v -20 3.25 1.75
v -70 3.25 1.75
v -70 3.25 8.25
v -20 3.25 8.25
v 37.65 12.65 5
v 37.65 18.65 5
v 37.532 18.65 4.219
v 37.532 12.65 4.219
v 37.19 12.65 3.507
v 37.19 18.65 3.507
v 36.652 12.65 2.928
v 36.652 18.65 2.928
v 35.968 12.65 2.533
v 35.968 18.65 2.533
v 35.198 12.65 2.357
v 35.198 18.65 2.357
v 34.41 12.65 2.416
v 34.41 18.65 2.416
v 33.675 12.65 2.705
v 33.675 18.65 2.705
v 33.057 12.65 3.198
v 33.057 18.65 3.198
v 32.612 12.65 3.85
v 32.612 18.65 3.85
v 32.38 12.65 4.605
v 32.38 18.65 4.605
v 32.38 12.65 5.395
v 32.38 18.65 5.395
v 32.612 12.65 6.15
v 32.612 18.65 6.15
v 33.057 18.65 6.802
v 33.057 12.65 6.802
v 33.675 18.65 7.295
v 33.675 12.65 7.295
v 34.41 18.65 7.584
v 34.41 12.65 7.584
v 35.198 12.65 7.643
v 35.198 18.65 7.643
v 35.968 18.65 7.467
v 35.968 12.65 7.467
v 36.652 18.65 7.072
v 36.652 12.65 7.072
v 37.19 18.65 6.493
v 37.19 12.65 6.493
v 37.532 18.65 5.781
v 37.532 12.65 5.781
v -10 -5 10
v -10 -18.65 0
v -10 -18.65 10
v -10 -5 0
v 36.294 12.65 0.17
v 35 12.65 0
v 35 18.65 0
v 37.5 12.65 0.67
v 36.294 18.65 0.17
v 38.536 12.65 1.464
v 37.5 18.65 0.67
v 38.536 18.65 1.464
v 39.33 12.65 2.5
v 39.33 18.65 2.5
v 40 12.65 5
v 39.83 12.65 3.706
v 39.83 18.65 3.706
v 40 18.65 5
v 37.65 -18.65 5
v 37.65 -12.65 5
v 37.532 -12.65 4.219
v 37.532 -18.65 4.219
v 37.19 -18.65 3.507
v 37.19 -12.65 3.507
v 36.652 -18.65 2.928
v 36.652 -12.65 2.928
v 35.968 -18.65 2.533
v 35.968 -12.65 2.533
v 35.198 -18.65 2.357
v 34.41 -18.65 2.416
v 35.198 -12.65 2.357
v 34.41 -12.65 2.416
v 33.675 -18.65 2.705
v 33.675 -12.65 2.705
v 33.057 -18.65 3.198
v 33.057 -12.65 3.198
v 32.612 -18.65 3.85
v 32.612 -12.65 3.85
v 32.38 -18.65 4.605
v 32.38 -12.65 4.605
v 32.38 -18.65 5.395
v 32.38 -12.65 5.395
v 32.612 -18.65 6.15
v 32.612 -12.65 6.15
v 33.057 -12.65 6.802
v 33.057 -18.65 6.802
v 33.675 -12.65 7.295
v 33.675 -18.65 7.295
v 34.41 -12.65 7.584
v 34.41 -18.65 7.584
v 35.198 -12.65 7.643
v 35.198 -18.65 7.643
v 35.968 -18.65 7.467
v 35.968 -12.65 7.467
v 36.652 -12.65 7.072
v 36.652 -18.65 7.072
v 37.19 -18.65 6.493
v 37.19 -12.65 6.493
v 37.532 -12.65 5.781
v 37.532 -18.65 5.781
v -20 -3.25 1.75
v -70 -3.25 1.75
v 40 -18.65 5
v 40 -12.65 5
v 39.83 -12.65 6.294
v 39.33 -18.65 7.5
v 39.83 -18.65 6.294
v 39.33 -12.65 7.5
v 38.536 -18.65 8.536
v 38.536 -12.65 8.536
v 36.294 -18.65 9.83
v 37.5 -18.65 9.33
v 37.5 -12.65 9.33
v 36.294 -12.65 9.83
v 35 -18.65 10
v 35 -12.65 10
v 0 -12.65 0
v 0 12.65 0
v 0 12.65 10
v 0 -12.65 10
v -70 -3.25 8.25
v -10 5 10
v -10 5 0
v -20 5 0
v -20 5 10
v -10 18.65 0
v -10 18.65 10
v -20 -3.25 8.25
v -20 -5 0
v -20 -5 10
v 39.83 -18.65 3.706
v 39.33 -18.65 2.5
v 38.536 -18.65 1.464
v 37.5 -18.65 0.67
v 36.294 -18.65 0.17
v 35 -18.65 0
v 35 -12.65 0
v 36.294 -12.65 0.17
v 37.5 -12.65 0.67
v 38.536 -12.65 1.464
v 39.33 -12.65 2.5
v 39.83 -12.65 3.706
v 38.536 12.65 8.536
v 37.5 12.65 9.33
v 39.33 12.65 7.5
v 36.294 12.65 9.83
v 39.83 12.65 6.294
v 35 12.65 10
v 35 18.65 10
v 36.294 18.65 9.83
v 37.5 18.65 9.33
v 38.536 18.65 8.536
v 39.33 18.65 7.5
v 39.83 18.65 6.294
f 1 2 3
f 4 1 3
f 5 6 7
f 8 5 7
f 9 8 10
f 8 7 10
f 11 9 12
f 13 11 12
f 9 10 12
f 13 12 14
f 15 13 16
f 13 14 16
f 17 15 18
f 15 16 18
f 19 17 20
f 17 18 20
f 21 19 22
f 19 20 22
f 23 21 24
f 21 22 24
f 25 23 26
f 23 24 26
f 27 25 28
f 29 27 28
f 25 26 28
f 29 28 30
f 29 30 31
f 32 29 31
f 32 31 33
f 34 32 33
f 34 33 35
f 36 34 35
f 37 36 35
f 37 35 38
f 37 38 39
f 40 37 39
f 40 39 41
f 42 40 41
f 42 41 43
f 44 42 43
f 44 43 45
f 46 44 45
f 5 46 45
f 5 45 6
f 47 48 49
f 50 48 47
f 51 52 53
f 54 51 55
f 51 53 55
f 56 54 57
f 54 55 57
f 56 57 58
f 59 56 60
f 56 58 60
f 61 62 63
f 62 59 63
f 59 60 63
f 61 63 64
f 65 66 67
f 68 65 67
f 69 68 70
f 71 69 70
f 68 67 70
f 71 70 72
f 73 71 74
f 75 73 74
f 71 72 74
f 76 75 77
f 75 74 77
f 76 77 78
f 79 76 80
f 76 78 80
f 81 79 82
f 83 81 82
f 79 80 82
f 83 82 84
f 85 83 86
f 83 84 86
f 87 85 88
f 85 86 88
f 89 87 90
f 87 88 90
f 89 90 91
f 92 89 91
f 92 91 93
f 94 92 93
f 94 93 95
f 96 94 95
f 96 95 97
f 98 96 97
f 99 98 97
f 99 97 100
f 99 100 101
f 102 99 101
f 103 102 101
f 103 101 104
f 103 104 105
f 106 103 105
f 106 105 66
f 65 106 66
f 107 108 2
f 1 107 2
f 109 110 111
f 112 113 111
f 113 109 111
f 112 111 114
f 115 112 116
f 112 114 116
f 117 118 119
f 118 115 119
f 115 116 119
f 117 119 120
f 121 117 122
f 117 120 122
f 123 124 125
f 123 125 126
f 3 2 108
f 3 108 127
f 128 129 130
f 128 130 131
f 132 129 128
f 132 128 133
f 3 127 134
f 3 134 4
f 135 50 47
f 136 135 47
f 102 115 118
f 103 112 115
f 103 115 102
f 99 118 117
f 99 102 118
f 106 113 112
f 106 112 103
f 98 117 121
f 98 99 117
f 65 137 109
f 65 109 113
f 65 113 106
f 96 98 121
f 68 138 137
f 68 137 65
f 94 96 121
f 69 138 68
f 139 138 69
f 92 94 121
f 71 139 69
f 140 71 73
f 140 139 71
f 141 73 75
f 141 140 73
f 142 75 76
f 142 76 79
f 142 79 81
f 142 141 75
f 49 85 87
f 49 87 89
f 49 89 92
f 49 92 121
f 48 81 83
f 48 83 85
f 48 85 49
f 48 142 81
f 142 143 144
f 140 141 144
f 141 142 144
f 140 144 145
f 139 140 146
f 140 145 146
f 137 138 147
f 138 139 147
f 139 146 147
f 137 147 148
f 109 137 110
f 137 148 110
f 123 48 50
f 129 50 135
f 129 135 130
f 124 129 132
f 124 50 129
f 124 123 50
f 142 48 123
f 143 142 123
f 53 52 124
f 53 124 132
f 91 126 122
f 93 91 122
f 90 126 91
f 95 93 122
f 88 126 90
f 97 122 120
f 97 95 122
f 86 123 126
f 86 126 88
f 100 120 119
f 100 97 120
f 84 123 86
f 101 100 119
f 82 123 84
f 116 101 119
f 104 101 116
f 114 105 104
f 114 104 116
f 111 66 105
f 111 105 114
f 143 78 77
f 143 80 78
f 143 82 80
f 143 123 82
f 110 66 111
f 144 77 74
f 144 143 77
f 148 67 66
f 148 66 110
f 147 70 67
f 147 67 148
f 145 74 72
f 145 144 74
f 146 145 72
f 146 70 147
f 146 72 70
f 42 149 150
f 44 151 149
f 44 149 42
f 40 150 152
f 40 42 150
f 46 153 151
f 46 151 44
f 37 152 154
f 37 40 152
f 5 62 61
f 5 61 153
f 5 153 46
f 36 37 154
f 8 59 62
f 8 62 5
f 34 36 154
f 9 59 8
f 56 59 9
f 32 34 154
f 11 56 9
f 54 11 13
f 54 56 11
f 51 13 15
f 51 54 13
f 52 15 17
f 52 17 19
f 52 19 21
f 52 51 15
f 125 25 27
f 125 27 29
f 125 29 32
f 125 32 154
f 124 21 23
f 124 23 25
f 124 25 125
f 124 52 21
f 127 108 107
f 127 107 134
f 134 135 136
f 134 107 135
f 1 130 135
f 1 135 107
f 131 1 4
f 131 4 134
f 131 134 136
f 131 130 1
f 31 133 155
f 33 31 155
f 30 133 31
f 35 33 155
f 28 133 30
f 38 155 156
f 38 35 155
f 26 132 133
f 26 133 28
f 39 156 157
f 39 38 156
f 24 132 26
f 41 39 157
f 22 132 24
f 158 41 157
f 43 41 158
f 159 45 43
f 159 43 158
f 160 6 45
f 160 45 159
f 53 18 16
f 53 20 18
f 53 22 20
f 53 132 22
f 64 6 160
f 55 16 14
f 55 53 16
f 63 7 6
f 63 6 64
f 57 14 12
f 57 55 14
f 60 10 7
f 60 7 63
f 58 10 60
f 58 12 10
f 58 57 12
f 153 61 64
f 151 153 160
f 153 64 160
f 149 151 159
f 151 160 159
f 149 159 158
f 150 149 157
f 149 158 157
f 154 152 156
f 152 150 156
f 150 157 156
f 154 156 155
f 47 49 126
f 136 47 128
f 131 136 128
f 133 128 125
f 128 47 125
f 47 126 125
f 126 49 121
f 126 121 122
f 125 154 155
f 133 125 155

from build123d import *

# Parameters (mm, degrees)
EXTRUDE_1_DEPTH     = 10
SKETCH_2_W          = 10
SKETCH_2_H          = 10
SKETCH_2_W_2        = 6.5
SKETCH_2_H_2        = 6.5
EXTRUDE_2_DEPTH     = 10
EXTRUDE_START       = 10
SKETCH_2_3_W        = 6.5
SKETCH_2_3_H        = 6.5
EXTRUDE_3_DEPTH     = 50
CUT_EXTRUDE_1_DEPTH = 80.945543966


with BuildPart() as part:
    # 草图1 → 凸台-拉伸1 (new body)
    with BuildSketch(Plane.XY):
        Polygon((0, 12.65), (0, -12.65), (40, -12.65), (40, -18.65), (-10, -18.65), (-10, 18.65), (40, 18.65), (40, 12.65), align=None)
    extrude(amount=EXTRUDE_1_DEPTH)

    # 草图2 → 凸台-拉伸2 (add)
    # profile 1 of 2: a face of its own
    with BuildSketch(Plane.ZY.offset(10)):
        with Locations((5, 0)):
            Rectangle(SKETCH_2_W, SKETCH_2_H)
        with Locations((5, 0)):
            Rectangle(SKETCH_2_W_2, SKETCH_2_H_2, mode=Mode.SUBTRACT)
    # profile 2 of 2: a face of its own
    with BuildSketch(Plane.ZY.offset(10)):
        with Locations((5, 0)):
            Rectangle(SKETCH_2_W_2, SKETCH_2_H_2)
    extrude(amount=EXTRUDE_2_DEPTH)

    # 草图2<3> → 凸台-拉伸3 (add)
    with BuildSketch(Plane.ZY.offset(10).offset(EXTRUDE_START)):
        with Locations((5, 0)):
            Rectangle(SKETCH_2_3_W, SKETCH_2_3_H)
    extrude(amount=EXTRUDE_3_DEPTH)

    # 草图3 → 切除-拉伸1 (cut, through all)
    with BuildSketch(Plane(origin=(0, 18.65, 0), x_dir=(1, 0, 0), z_dir=(0, 1, 0))):
        with BuildLine():
            ThreePointArc((32.35, -5), (35, -7.65), (37.65, -5))
            Line((37.65, -5), (32.35, -5))
        make_face()
        with BuildLine():
            Line((32.35, -5), (37.65, -5))
            ThreePointArc((37.65, -5), (35, -2.35), (32.35, -5))
        make_face()
        with BuildLine():
            ThreePointArc((35, 0), (38.535533906, -1.464466094), (40, -5))
            Line((40, -5), (40, 0))
            Line((40, 0), (35, 0))
        make_face()
        with BuildLine():
            Line((40, -10), (40, -5))
            ThreePointArc((40, -5), (38.535533906, -8.535533906), (35, -10))
            Line((35, -10), (40, -10))
        make_face()
    extrude(amount=-CUT_EXTRUDE_1_DEPTH, mode=Mode.SUBTRACT)


solid = part.part
